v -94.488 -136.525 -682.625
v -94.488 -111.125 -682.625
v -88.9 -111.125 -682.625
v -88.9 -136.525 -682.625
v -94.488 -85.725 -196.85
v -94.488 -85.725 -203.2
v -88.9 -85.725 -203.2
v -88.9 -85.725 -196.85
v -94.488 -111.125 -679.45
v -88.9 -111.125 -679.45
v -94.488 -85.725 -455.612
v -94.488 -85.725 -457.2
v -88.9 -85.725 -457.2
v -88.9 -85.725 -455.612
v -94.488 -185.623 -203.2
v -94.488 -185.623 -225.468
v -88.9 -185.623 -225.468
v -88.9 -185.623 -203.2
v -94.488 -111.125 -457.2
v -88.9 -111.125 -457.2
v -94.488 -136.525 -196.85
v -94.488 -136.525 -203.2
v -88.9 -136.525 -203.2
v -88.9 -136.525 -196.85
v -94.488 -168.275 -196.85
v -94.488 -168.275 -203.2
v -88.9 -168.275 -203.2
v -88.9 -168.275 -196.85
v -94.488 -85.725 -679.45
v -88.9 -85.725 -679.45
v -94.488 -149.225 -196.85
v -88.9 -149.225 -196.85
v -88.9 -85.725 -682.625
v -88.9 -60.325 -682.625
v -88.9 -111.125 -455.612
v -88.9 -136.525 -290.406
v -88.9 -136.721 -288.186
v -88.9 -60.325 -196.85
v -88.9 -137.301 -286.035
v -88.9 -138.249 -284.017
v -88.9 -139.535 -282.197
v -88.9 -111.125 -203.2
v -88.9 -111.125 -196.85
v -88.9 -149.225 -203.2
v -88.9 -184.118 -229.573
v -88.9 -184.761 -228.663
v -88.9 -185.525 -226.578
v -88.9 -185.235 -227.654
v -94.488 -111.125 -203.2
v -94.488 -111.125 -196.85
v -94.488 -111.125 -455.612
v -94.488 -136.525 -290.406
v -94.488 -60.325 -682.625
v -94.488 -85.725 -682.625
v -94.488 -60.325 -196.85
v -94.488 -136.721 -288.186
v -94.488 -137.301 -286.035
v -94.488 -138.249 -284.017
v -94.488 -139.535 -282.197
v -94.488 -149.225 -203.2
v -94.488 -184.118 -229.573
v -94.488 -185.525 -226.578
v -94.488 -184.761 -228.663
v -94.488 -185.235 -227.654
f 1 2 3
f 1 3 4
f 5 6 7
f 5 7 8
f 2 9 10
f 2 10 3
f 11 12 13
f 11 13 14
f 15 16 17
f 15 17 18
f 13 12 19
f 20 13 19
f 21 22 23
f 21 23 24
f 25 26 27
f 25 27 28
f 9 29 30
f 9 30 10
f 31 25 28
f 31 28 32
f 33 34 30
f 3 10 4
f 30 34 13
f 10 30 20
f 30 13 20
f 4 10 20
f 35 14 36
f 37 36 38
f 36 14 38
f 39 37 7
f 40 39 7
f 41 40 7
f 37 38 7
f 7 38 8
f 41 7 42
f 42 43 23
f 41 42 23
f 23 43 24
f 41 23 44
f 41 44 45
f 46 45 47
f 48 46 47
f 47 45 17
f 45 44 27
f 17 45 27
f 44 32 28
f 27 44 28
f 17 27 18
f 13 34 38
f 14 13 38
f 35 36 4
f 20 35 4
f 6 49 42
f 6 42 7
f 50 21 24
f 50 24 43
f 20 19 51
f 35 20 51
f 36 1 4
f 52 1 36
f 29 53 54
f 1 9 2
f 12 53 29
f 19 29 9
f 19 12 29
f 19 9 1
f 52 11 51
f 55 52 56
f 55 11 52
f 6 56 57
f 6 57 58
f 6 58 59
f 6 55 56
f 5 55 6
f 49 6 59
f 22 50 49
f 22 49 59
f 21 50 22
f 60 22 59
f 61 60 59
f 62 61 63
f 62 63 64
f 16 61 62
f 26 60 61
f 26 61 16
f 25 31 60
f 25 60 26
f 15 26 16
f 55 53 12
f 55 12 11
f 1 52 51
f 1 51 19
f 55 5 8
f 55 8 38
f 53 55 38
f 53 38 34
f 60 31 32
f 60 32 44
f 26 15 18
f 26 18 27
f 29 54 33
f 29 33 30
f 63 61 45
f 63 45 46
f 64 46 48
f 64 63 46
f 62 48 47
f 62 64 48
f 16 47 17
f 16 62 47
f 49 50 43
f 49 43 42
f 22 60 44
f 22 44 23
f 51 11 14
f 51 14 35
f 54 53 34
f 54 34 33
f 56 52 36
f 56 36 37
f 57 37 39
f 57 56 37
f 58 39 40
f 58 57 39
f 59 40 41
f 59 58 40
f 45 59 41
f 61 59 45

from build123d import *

# Parameters (mm, degrees)
SKETCH1_W           = 25.4
SKETCH1_H           = 1.5875
BOSS_EXTRUDE1_DEPTH = 5.588


with BuildPart() as part:
    # Sketch1 → Boss-Extrude1 (new body)
    # profile 1 of 2: a face of its own
    with BuildSketch(Plane(origin=(-94.488, 0, 0), x_dir=(0, -1, 0), z_dir=(-1, 0, 0))):
        Polygon((136.525, -196.85), (111.125, -196.85), (111.125, -203.2), (85.725, -203.2), (85.725, -196.85), (60.325, -196.85), (60.325, -682.625), (85.725, -682.625), (85.725, -679.45), (111.125, -679.45), (111.125, -682.625), (136.525, -682.625), align=None)
        with Locations((98.425, -456.40625)):
            Rectangle(SKETCH1_W, SKETCH1_H, mode=Mode.SUBTRACT)
    # profile 2 of 2: a face of its own
    with BuildSketch(Plane(origin=(-94.488, 0, 0), x_dir=(0, -1, 0), z_dir=(-1, 0, 0))):
        with BuildLine():
            Line((149.225, -203.2), (136.525, -203.2))
            Line((136.525, -203.2), (136.525, -290.406498707))
            ThreePointArc((136.525, -290.406498707), (137.30121982, -286.034603668), (139.534994681, -282.197126202))
            Line((139.534994681, -282.197126202), (184.118202659, -229.57294303))
            ThreePointArc((184.118202659, -229.57294303), (185.23509009, -227.654204297), (185.6232, -225.468256778))
            Line((185.6232, -225.468256778), (185.6232, -203.2))
            Line((185.6232, -203.2), (168.275, -203.2))
            Line((168.275, -203.2), (168.275, -196.85))
            Line((168.275, -196.85), (149.225, -196.85))
            Line((149.225, -196.85), (149.225, -203.2))
        make_face()
    extrude(amount=-BOSS_EXTRUDE1_DEPTH)


solid = part.part
